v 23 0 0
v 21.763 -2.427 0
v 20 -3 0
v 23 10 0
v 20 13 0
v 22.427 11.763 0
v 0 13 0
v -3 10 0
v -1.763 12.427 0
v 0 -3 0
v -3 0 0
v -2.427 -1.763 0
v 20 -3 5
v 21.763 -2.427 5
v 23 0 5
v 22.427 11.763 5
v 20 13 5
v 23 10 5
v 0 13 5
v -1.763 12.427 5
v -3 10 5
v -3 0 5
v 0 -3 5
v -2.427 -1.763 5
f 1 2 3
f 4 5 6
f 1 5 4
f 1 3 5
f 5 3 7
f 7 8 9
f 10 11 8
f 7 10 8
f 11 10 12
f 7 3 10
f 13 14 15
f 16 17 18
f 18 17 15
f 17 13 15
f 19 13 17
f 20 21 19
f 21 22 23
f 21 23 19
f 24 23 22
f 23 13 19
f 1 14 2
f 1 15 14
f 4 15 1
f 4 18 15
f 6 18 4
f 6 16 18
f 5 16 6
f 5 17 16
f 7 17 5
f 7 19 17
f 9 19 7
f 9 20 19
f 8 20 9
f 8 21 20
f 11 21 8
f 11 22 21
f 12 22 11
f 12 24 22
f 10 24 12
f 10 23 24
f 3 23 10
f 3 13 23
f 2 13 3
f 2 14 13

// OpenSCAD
// Stage 2 of docs/audits/exact-geometry-rust.md: extrusions.
// A rounded rectangle: offset(r) arcs become cylinders tangent to the flat sides.
// volume: 2041.3716694115408
linear_extrude(5) offset(r=3) square([20, 10]);
